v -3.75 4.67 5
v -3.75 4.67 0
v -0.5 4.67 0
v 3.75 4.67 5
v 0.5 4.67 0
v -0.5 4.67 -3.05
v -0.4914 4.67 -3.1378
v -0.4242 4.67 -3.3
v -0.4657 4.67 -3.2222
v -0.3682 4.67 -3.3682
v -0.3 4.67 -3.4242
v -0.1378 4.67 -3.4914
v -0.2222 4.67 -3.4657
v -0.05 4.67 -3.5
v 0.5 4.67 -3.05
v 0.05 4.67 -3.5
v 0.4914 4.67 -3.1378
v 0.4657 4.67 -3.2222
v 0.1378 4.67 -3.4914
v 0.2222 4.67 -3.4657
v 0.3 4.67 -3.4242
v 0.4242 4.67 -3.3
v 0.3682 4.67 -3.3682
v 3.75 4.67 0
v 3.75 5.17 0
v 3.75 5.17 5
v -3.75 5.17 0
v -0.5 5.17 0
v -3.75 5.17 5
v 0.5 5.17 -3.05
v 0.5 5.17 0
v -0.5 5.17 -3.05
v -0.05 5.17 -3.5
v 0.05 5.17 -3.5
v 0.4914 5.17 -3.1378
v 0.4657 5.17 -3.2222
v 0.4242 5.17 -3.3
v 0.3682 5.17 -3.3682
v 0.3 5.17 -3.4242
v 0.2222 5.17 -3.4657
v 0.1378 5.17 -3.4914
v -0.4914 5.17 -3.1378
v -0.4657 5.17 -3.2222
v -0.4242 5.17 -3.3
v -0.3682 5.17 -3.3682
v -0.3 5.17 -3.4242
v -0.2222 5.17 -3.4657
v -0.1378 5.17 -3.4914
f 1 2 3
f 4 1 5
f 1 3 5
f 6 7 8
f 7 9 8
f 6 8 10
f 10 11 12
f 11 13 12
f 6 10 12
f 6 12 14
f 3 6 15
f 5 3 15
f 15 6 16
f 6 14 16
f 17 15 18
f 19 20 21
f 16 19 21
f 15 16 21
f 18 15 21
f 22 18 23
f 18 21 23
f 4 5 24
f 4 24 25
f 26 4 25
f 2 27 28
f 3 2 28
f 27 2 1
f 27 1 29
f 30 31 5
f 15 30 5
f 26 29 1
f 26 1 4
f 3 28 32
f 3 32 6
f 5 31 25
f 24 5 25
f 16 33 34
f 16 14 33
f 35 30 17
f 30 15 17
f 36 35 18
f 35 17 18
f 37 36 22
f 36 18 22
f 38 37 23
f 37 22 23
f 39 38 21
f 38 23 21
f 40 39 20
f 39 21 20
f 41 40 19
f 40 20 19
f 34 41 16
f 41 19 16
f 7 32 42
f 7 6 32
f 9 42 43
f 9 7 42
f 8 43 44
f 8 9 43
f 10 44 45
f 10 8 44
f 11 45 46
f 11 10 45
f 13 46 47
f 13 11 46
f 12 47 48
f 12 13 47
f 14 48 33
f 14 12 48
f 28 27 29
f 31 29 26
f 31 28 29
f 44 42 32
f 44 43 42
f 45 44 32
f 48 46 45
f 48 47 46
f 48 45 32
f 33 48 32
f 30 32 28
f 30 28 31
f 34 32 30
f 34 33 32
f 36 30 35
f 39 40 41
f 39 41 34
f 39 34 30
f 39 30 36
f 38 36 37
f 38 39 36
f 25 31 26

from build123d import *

# Parameters (mm, degrees)
SKETCH027_W  = 7.5
SKETCH027_H  = 0.5
PAD011_DEPTH = 5
SKETCH028_W  = 1
SKETCH028_H  = 0.5
PAD012_DEPTH = 3.5
FILLET006_R  = 0.45


with BuildPart() as part:
    # Sketch027 → Pad011 (new body)
    with BuildSketch(Plane.XY):
        with Locations((0, 4.92)):
            Rectangle(SKETCH027_W, SKETCH027_H)
    extrude(amount=PAD011_DEPTH)

    # Sketch028 (on Face5 of Pad011) → Pad012 (join)
    with BuildSketch(Plane(origin=(0, 0, 0), x_dir=(1, 0, 0), z_dir=(0, 0, -1))):
        with Locations((0, -4.92)):
            Rectangle(SKETCH028_W, SKETCH028_H)
    extrude(amount=PAD012_DEPTH)

    # Fillet006
    fillet006_edges = [part.edges().sort_by_distance(p)[0] for p in [
        (0.5, 4.92, -3.5),
        (-0.5, 4.92, -3.5),
    ]]
    fillet(fillet006_edges, radius=FILLET006_R)


solid = part.part
